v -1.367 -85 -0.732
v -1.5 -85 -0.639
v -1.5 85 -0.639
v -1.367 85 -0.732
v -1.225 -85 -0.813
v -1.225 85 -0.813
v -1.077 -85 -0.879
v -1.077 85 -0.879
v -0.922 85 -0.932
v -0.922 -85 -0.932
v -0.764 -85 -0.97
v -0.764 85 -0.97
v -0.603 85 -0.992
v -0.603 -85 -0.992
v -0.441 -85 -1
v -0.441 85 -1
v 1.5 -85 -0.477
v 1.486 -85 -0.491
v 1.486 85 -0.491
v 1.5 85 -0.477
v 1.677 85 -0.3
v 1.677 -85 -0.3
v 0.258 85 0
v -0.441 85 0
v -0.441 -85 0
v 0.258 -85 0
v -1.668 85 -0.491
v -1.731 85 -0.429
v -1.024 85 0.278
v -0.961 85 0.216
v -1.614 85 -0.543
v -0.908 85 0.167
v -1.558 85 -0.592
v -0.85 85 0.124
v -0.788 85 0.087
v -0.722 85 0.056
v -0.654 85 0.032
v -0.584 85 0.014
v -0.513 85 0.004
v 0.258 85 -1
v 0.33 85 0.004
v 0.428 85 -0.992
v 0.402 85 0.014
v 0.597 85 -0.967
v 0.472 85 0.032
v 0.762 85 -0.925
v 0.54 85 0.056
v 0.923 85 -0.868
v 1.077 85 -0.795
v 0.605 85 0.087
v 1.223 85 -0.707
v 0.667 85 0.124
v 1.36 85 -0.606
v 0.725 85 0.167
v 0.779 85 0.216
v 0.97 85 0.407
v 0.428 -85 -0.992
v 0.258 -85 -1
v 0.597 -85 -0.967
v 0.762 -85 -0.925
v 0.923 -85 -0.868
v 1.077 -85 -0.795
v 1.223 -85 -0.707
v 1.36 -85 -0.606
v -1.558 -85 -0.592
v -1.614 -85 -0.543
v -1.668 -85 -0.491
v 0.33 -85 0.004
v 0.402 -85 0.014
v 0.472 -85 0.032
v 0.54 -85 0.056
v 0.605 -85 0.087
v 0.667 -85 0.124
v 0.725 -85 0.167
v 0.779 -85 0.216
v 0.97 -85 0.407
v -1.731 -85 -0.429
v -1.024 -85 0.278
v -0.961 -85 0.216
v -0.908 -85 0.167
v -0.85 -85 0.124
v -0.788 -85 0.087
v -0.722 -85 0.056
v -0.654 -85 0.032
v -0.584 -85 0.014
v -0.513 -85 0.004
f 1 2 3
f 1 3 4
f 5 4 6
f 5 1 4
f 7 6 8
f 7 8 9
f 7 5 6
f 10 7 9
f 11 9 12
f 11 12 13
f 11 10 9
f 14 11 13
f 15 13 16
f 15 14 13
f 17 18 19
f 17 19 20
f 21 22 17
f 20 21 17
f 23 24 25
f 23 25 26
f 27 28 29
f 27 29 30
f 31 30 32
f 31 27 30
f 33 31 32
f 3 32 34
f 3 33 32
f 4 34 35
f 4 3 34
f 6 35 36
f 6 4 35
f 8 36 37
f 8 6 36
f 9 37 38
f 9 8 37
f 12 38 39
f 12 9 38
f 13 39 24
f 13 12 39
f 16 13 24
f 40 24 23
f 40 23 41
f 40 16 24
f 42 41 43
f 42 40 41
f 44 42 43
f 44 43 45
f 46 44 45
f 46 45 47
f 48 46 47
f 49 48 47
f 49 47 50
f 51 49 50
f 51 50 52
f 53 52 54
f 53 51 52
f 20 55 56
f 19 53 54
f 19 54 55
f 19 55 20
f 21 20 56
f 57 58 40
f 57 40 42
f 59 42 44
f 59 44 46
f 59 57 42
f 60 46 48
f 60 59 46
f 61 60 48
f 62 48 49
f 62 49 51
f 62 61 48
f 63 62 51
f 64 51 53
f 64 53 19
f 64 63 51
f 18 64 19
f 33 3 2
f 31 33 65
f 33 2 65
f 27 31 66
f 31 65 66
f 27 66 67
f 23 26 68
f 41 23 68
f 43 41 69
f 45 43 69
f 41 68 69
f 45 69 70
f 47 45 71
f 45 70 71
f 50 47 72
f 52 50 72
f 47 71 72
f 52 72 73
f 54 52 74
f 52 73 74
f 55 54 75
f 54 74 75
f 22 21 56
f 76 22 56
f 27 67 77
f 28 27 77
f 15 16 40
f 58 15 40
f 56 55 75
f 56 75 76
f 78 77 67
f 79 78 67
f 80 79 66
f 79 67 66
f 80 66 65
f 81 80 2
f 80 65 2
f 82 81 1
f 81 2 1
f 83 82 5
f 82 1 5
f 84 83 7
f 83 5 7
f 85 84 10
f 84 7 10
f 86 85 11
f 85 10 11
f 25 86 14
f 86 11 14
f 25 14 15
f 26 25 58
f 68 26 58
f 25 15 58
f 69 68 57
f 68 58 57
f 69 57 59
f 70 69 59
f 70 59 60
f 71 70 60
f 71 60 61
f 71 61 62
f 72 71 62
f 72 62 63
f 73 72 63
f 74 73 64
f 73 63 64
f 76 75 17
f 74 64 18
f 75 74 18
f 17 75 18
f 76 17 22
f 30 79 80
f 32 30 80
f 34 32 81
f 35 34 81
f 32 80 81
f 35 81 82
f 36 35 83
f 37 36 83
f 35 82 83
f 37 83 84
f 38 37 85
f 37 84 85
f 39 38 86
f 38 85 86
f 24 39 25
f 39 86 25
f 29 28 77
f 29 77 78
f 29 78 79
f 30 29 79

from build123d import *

# Parameters (mm, degrees)
SKETCH1_W              = 3
SKETCH1_H              = 170
BASE_FLANGE1_DEPTH     = 1
SKETCHED_START         = -85
SKETCHED_BEND1_DEPTH   = 170
SKETCHED_BEND1_2_DEPTH = 170


# Read off the part's stored shape, not the designer's step: Sketched Bend1
# Sheet-metal steps are written as plain solids
with BuildPart() as part:
    # Sketch1 → Base-Flange1 (new body)
    with BuildSketch(Plane.XY):
        Rectangle(SKETCH1_W, SKETCH1_H)
    extrude(amount=-BASE_FLANGE1_DEPTH)

    # Sketched Bend1 outline → Sketched Bend1 (cut)
    with BuildSketch(Plane(origin=(0, 0, 0), x_dir=(1, 0, 0), z_dir=(0, 1, 0)).offset(SKETCHED_START)):
        with BuildLine():
            ThreePointArc((-1.5, 0.63935721), (-1.000103552, 0.907368803), (-0.440508936, 1))
            Line((-0.440508936, 1), (-1.5, 1))
            Line((-1.5, 1), (-1.5, 0.63935721))
        make_face()
        with BuildLine():
            Line((1.5, 1), (0.258023252, 1))
            ThreePointArc((0.258023252, 1), (0.922591301, 0.867809196), (1.485984888, 0.491361636))
            Line((1.485984888, 0.491361636), (1.5, 0.477346524))
            Line((1.5, 0.477346524), (1.5, 1))
        make_face()
        Polygon((-1.301938308, 0), (-1.5, 0.198061692), (-1.5, 0), align=None)
        Polygon((1.5, 0), (1.5, 0.122473647), (1.377526353, 0), align=None)
    extrude(amount=SKETCHED_BEND1_DEPTH, mode=Mode.SUBTRACT)

    # Sketched Bend1 2 outline → Sketched Bend1 2 (add)
    with BuildSketch(Plane(origin=(0, 0, 0), x_dir=(1, 0, 0), z_dir=(0, 1, 0)).offset(SKETCHED_START)):
        with BuildLine():
            Line((-1.5, 0.198061692), (-1.5, 0.63935721))
            ThreePointArc((-1.5, 0.63935721), (-1.586626572, 0.568081541), (-1.668470572, 0.491361636))
            Line((-1.668470572, 0.491361636), (-1.730885258, 0.42894695))
            Line((-1.730885258, 0.42894695), (-1.5, 0.198061692))
        make_face()
        with BuildLine():
            Line((-0.440508936, 0), (-1.301938308, 0))
            Line((-1.301938308, 0), (-1.023778477, -0.278159831))
            Line((-1.023778477, -0.278159831), (-0.961363791, -0.215745145))
            ThreePointArc((-0.961363791, -0.215745145), (-0.722393552, -0.056070336), (-0.440508936, 0))
        make_face()
        Polygon((1.677436439, 0.299910086), (1.5, 0.477346524), (1.5, 0.122473647), align=None)
        with BuildLine():
            Line((1.377526353, 0), (0.258023252, 0))
            ThreePointArc((0.258023252, 0), (0.539907869, -0.056070336), (0.778878107, -0.215745145))
            Line((0.778878107, -0.215745145), (0.970329658, -0.407196695))
            Line((0.970329658, -0.407196695), (1.377526353, 0))
        make_face()
    extrude(amount=SKETCHED_BEND1_2_DEPTH)


solid = part.part
